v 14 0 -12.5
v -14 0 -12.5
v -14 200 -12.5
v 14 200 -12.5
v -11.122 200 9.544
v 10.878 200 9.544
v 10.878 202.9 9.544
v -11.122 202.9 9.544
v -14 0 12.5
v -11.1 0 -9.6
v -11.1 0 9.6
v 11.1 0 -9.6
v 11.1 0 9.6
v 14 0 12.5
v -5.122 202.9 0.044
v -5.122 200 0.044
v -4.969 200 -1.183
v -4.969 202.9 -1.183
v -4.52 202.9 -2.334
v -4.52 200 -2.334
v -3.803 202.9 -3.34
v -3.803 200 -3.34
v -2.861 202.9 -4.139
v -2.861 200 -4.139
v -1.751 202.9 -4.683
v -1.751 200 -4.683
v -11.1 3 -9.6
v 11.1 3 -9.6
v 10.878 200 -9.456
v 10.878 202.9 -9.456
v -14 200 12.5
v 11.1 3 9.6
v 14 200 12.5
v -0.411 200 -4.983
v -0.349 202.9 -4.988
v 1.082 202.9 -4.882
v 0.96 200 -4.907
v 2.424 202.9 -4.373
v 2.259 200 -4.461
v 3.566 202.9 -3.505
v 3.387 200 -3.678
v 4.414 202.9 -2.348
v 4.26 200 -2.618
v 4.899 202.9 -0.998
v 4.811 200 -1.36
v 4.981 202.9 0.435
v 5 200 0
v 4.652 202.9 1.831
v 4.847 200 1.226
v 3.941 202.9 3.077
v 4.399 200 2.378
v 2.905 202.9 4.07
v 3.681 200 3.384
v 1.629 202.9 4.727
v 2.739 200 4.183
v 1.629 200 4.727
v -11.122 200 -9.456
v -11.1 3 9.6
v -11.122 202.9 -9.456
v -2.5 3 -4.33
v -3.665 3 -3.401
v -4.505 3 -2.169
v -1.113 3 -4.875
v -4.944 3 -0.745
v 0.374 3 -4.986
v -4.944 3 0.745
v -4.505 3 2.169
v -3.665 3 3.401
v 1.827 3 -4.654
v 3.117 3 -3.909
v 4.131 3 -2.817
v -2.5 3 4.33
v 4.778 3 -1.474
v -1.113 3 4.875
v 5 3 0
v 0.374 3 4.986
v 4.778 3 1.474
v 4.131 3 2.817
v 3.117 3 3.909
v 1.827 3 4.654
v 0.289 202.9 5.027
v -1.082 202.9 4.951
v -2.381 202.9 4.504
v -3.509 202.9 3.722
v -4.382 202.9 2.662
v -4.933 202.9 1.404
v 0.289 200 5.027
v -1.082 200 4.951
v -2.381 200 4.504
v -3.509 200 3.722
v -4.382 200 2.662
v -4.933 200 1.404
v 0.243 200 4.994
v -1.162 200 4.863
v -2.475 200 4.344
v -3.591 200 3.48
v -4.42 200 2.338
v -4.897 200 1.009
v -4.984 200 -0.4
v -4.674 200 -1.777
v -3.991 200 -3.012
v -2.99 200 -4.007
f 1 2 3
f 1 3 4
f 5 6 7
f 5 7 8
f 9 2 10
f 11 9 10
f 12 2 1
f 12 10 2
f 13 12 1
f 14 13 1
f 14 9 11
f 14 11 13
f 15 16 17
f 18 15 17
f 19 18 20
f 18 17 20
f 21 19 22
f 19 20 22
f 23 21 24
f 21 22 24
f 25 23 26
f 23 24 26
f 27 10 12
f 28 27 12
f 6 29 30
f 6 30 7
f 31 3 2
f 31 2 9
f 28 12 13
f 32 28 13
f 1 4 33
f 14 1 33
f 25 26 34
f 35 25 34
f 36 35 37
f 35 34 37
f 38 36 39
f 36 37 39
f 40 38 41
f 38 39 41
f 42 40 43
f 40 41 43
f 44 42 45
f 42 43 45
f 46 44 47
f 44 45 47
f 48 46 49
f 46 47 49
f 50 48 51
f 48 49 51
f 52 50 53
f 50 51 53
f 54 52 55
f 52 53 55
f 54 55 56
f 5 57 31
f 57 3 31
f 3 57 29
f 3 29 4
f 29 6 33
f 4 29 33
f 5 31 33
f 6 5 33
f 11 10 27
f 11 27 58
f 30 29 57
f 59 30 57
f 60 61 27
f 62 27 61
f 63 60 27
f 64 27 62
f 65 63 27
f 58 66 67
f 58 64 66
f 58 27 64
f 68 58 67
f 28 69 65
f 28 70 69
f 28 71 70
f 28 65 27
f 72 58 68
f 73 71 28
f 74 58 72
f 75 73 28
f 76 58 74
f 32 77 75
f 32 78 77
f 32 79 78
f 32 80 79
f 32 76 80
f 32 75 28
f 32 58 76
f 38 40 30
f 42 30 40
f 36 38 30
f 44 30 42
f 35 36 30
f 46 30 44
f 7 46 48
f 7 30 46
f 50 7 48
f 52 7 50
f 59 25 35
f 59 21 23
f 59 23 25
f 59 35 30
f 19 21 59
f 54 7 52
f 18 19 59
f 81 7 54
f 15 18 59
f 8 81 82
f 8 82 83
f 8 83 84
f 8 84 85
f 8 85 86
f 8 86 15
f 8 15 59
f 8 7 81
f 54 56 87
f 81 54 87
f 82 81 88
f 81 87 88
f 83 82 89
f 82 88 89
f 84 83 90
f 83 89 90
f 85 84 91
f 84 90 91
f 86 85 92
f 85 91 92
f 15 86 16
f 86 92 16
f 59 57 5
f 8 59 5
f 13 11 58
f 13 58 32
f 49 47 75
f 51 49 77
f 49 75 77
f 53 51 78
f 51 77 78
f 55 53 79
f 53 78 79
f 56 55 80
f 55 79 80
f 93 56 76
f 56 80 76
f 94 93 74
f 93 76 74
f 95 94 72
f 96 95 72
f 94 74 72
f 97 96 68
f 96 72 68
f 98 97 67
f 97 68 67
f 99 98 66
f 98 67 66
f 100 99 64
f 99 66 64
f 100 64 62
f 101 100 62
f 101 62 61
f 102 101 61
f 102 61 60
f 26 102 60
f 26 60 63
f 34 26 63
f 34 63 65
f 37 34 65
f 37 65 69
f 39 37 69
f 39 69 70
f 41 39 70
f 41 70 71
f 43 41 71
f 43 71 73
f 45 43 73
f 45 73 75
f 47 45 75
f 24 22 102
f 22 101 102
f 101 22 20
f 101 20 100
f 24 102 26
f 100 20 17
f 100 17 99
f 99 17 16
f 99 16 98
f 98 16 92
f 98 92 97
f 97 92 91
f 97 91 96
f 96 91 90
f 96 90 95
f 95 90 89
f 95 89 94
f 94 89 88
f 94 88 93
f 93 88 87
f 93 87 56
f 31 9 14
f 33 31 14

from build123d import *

# Parameters (mm, degrees)
F0_W     = 28
F0_H     = 25
F0_W_2   = 22.2
F0_H_2   = 19.2
F0_R     = 5
F1_DEPTH = 200
F2_DEPTH = 3
F3_W     = 22
F3_H     = 19
F4_DEPTH = 2.9


with BuildPart() as f1:
    # F0 (on Front) → F1 (new body)
    with BuildSketch(Plane.XZ):
        Rectangle(F0_W, F0_H)
        Rectangle(F0_W_2, F0_H_2, mode=Mode.SUBTRACT)
        Rectangle(F0_W_2, F0_H_2)
        Circle(F0_R, mode=Mode.SUBTRACT)
    extrude(amount=-F1_DEPTH)

    # F0 (on Front) → F2 (cut)
    with BuildSketch(Plane.XZ):
        Rectangle(F0_W_2, F0_H_2)
        Circle(F0_R, mode=Mode.SUBTRACT)
    extrude(amount=-F2_DEPTH, mode=Mode.SUBTRACT)

    # F3 (on face) → F4 (join)
    with BuildSketch(Plane(origin=(0, 200, 0), x_dir=(-1, 0, 0), z_dir=(0, 1, 0))):
        with Locations((0.121734367, 0.0437281778)):
            Rectangle(F3_W, F3_H)
        with BuildLine():
            ThreePointArc((-1.6292965707, 4.7270913557), (2.9717207978, 4.1519610515), (5.121734367, 0.0437281778))
            ThreePointArc((5.121734367, 0.0437281778), (4.1927589833, -2.8591597934), (1.7510309376, -4.6833631778))
            ThreePointArc((1.7510309376, -4.6833631778), (-4.7056209416, -1.690305166), (-1.6292965707, 4.7270913557))
        make_face(mode=Mode.SUBTRACT)
    extrude(amount=F4_DEPTH)


solid = f1.part
